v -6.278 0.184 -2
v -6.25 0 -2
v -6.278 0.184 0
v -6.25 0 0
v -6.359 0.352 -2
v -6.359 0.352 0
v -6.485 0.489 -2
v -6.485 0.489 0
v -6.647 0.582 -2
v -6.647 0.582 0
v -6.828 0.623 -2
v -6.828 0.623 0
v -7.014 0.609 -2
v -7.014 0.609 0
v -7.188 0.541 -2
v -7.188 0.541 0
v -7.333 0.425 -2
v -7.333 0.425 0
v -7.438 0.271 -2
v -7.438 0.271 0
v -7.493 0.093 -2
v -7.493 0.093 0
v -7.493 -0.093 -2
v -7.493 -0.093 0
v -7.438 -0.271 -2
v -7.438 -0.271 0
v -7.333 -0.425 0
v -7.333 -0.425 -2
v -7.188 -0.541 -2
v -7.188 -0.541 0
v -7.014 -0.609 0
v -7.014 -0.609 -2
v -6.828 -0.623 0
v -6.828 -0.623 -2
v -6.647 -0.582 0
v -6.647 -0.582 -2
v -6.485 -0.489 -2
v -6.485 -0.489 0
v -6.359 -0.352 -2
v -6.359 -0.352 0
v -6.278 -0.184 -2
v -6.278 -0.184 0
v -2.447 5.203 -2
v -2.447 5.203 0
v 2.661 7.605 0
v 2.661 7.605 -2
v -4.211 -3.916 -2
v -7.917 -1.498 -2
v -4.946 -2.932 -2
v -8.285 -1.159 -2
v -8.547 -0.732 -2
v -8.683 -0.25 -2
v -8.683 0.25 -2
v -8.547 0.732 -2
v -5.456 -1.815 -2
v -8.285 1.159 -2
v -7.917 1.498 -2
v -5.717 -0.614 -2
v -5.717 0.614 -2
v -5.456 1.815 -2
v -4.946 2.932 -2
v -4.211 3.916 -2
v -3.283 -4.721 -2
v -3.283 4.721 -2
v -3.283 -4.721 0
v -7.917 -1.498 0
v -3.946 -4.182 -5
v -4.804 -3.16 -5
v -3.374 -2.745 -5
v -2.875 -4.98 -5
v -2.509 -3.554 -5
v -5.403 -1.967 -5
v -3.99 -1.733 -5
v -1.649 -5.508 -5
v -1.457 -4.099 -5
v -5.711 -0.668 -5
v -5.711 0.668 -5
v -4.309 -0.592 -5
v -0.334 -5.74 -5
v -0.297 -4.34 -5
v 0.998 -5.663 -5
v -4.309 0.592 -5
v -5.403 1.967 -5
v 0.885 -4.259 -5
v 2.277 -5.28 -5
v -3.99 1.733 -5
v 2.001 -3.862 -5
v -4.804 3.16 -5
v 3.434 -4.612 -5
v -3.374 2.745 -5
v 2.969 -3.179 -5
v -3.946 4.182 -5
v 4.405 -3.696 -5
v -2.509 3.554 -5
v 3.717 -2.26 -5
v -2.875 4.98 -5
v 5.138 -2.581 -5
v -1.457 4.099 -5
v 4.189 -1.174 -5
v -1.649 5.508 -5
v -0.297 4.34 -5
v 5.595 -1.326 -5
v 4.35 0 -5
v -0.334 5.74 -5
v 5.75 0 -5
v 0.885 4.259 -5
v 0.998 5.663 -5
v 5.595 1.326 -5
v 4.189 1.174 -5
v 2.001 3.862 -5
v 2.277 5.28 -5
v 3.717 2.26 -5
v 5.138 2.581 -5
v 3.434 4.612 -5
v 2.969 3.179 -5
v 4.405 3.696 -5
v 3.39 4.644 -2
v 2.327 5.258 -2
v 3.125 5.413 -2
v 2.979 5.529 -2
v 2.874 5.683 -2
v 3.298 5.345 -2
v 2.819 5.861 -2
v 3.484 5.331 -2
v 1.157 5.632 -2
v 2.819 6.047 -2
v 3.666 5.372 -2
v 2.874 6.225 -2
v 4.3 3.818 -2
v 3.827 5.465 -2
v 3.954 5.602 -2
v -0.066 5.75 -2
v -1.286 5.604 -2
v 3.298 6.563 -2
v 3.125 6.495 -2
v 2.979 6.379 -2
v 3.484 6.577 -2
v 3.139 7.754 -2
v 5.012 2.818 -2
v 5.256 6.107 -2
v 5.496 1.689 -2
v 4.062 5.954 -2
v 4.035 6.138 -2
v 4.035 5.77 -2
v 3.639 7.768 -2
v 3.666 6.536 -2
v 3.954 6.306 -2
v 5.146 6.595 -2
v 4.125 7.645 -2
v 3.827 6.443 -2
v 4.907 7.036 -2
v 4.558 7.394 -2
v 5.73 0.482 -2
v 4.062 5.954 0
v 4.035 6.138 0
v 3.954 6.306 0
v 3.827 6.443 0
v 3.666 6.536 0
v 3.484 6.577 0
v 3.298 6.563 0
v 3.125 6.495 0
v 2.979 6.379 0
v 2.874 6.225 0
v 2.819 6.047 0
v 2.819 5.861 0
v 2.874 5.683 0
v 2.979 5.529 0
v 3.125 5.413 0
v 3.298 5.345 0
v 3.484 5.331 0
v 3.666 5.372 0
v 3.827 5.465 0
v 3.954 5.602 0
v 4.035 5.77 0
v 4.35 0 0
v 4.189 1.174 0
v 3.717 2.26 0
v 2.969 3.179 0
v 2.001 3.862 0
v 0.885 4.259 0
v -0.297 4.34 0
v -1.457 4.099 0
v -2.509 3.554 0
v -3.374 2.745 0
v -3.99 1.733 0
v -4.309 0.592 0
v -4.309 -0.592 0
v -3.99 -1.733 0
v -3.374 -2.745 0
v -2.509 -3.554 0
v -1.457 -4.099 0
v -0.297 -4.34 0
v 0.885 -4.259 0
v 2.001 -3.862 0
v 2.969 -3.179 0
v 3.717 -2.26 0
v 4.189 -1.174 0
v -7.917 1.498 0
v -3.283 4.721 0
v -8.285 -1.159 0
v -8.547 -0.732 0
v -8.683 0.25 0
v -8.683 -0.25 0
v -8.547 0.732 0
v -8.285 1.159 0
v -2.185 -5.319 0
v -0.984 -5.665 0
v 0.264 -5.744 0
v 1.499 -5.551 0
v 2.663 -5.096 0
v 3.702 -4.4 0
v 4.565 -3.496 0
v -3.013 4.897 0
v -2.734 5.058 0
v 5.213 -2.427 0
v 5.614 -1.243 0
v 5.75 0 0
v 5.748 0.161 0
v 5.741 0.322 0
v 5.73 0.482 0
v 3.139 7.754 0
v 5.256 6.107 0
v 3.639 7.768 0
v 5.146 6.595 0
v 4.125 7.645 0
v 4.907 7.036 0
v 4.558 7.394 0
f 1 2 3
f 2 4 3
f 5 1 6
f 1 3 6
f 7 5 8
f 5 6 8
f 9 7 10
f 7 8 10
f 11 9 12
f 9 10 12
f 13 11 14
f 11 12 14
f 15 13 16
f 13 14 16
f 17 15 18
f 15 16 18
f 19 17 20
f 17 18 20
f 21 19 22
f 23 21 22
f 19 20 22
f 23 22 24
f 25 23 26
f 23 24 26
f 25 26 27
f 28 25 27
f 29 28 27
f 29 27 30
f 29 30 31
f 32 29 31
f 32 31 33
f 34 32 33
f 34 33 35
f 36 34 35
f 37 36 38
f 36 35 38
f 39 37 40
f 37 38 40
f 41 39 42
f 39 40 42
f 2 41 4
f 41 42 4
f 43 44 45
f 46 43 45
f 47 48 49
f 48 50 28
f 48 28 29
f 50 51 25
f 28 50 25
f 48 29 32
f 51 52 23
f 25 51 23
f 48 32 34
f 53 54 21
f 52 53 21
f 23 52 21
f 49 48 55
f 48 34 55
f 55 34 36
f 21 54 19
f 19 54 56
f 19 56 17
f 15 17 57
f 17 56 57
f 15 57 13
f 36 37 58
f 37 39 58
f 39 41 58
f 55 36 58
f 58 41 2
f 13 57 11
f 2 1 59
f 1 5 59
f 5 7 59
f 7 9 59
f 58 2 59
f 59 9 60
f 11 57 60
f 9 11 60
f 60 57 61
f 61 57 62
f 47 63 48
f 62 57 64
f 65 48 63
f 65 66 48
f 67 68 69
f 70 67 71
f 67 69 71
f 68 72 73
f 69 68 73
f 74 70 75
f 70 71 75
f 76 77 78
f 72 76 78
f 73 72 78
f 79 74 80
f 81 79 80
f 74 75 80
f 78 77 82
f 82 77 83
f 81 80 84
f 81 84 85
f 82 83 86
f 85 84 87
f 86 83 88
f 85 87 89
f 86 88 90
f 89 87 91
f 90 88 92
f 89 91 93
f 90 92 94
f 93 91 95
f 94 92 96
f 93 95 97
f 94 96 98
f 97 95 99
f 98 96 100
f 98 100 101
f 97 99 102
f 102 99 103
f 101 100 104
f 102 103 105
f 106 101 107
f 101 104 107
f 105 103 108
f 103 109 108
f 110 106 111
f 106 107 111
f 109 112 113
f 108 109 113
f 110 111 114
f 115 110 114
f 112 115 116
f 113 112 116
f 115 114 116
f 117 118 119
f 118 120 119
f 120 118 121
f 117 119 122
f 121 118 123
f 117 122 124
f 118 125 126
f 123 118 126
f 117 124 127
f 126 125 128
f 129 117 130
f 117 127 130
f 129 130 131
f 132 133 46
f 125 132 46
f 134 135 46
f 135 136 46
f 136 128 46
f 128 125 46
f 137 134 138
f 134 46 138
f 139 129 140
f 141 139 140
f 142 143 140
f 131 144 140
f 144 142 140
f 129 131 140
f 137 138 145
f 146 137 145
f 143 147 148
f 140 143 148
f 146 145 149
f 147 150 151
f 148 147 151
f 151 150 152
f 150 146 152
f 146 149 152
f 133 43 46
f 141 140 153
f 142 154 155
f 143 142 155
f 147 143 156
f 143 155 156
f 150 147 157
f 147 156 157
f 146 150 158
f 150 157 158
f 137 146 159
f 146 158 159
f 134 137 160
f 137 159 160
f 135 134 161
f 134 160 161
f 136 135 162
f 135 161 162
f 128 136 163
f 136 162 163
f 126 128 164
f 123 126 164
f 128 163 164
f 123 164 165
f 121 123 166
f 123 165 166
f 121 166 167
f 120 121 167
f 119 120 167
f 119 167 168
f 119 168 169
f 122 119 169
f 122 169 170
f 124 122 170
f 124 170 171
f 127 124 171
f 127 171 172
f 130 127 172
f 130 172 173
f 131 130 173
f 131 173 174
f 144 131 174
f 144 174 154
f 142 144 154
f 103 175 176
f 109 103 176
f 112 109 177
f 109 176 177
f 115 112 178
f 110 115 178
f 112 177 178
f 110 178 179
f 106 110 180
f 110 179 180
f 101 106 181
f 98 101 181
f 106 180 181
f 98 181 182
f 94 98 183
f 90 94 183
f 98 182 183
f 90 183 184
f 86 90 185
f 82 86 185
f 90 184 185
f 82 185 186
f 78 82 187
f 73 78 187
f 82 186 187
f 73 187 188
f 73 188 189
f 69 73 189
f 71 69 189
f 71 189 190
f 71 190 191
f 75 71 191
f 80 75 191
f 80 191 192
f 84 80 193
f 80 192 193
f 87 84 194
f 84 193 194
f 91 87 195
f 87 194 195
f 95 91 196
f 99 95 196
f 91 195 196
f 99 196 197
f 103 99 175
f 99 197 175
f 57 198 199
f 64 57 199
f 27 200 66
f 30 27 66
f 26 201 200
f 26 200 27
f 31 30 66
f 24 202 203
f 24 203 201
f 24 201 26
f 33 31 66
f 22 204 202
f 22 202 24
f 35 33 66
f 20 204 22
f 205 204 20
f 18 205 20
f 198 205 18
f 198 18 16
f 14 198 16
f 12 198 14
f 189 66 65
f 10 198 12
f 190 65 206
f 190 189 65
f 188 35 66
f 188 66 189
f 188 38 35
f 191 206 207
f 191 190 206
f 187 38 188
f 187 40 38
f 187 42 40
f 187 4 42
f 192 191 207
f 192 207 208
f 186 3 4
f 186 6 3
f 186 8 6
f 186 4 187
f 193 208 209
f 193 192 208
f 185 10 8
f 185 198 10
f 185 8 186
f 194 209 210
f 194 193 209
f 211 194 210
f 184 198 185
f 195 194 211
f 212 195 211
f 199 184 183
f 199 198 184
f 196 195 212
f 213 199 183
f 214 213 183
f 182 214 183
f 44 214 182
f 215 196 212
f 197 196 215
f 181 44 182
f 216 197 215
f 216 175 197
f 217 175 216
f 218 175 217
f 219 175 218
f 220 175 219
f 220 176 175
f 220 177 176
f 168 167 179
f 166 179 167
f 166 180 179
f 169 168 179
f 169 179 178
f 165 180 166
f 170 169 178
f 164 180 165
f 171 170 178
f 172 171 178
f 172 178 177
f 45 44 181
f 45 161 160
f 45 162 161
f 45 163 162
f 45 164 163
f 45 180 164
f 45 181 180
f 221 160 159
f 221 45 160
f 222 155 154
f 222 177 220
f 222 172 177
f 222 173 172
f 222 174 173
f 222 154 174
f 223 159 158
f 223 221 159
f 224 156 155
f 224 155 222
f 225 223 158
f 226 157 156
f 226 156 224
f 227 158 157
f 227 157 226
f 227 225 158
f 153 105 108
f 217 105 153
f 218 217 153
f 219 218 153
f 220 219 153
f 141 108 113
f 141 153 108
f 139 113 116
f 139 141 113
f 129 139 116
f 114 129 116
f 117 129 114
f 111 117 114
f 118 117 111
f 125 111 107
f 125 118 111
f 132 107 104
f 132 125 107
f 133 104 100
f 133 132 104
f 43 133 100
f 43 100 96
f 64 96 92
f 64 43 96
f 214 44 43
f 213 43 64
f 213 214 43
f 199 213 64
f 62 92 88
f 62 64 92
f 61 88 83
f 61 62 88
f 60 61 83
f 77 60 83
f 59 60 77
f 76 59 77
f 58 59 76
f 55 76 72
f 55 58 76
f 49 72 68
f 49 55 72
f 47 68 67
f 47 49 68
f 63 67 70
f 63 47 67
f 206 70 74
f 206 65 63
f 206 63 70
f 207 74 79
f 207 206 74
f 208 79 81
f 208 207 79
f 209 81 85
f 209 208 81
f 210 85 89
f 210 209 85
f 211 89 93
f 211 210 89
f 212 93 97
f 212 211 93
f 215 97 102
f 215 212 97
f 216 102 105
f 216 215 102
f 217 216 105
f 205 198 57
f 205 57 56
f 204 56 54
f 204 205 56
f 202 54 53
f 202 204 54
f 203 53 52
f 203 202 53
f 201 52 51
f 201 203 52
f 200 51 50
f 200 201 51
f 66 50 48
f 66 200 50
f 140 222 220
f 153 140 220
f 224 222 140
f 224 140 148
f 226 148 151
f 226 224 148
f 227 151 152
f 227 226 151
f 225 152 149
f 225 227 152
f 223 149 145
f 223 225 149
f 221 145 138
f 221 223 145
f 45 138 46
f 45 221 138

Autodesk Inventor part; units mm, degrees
ref_plane "YZ Plane" through (0, 0, 0) normal (1, 0, 0) x (0, 1, 0)
ref_plane "XZ Plane" through (0, 0, 0) normal (0, 1, 0) x (-1, 0, 0)
ref_plane "XY Plane" through (0, 0, 0) normal (0, 0, 1) x (1, 0, 0)
sketch "スケッチ1" plane through (0, 0, 0) normal (0, 0, 1) x (1, 0, 0)
  circle A0 centre (0, 0) radius 2.25 construction
  circle A1 centre (0, 0) radius 4.35
  circle A2 centre (0, 0) radius 5.75
  circle A3 centre (-6.875, 0) radius 0.625
  circle A4 centre (3.4375, 5.9539) radius 0.625
  circle A5 centre (0, 0) radius 6.875 construction
  circle A6 centre (-6.875, 0) radius 1.825
  circle A7 centre (3.4375, 5.9539) radius 1.825
  line L0 (-7.9169, 1.4983) -> (-3.2827, 4.7208)
  line L1 (-7.9169, -1.4983) -> (-3.2827, -4.7208)
  line L2 (5.2561, 6.1071) -> (5.7297, 0.4825)
  line L3 (-2.447, 5.2033) -> (2.6608, 7.6054)
  line L4 (3.4375, 5.9539) -> (0, 0) construction
  line L5 (0, 0) -> (-6.875, 0) construction
  circle A8 centre (0, 0) radius 4.25
  circle A9 centre (0, 0) radius 4.25
  point P0 (3.9306, 4.1968)
  point P1 (1.6692, 5.5024)
  point P2 (-5.5998, 1.3056)
  point P3 (-5.5998, -1.3056)
  dimension "d2" = 4.5
  dimension "d5" = 1.25
  dimension "d6" = 1.25
  dimension "d7" = 1.2
  dimension "d8" = 1.2
  dimension "d9" = 0.5
  dimension "d18" = 120
  dimension "d22" = 13.75
  dimension "d23" = 8.5
  dimension "d25" = 8.5
  dimension "d26" = 1.5
  dimension "d27" = 0.1
extrude "押し出し1" add sketch "スケッチ1" against normal blind 5 contours A2 A6 A7 | A7 A2 | A2 A6 picked at (2.6949, 4.8059) picked at (-5.5055, 0)
extrude "押し出し3" add sketch "スケッチ1" against normal blind 2 contours L1 A6 A2 | A6 A2 | A6 L0 A2 picked at (-5.951, -0.7528)
extrude "押し出し4" add sketch "スケッチ1" against normal blind 2 contours A2 A7 L2 | A2 A7 | A2 L3 A7 picked at (3.6121, 4.7707)
equation "\"d6\" = d5"
equation "\"d8\" = d7"
properties part number "motorauxiliary"
